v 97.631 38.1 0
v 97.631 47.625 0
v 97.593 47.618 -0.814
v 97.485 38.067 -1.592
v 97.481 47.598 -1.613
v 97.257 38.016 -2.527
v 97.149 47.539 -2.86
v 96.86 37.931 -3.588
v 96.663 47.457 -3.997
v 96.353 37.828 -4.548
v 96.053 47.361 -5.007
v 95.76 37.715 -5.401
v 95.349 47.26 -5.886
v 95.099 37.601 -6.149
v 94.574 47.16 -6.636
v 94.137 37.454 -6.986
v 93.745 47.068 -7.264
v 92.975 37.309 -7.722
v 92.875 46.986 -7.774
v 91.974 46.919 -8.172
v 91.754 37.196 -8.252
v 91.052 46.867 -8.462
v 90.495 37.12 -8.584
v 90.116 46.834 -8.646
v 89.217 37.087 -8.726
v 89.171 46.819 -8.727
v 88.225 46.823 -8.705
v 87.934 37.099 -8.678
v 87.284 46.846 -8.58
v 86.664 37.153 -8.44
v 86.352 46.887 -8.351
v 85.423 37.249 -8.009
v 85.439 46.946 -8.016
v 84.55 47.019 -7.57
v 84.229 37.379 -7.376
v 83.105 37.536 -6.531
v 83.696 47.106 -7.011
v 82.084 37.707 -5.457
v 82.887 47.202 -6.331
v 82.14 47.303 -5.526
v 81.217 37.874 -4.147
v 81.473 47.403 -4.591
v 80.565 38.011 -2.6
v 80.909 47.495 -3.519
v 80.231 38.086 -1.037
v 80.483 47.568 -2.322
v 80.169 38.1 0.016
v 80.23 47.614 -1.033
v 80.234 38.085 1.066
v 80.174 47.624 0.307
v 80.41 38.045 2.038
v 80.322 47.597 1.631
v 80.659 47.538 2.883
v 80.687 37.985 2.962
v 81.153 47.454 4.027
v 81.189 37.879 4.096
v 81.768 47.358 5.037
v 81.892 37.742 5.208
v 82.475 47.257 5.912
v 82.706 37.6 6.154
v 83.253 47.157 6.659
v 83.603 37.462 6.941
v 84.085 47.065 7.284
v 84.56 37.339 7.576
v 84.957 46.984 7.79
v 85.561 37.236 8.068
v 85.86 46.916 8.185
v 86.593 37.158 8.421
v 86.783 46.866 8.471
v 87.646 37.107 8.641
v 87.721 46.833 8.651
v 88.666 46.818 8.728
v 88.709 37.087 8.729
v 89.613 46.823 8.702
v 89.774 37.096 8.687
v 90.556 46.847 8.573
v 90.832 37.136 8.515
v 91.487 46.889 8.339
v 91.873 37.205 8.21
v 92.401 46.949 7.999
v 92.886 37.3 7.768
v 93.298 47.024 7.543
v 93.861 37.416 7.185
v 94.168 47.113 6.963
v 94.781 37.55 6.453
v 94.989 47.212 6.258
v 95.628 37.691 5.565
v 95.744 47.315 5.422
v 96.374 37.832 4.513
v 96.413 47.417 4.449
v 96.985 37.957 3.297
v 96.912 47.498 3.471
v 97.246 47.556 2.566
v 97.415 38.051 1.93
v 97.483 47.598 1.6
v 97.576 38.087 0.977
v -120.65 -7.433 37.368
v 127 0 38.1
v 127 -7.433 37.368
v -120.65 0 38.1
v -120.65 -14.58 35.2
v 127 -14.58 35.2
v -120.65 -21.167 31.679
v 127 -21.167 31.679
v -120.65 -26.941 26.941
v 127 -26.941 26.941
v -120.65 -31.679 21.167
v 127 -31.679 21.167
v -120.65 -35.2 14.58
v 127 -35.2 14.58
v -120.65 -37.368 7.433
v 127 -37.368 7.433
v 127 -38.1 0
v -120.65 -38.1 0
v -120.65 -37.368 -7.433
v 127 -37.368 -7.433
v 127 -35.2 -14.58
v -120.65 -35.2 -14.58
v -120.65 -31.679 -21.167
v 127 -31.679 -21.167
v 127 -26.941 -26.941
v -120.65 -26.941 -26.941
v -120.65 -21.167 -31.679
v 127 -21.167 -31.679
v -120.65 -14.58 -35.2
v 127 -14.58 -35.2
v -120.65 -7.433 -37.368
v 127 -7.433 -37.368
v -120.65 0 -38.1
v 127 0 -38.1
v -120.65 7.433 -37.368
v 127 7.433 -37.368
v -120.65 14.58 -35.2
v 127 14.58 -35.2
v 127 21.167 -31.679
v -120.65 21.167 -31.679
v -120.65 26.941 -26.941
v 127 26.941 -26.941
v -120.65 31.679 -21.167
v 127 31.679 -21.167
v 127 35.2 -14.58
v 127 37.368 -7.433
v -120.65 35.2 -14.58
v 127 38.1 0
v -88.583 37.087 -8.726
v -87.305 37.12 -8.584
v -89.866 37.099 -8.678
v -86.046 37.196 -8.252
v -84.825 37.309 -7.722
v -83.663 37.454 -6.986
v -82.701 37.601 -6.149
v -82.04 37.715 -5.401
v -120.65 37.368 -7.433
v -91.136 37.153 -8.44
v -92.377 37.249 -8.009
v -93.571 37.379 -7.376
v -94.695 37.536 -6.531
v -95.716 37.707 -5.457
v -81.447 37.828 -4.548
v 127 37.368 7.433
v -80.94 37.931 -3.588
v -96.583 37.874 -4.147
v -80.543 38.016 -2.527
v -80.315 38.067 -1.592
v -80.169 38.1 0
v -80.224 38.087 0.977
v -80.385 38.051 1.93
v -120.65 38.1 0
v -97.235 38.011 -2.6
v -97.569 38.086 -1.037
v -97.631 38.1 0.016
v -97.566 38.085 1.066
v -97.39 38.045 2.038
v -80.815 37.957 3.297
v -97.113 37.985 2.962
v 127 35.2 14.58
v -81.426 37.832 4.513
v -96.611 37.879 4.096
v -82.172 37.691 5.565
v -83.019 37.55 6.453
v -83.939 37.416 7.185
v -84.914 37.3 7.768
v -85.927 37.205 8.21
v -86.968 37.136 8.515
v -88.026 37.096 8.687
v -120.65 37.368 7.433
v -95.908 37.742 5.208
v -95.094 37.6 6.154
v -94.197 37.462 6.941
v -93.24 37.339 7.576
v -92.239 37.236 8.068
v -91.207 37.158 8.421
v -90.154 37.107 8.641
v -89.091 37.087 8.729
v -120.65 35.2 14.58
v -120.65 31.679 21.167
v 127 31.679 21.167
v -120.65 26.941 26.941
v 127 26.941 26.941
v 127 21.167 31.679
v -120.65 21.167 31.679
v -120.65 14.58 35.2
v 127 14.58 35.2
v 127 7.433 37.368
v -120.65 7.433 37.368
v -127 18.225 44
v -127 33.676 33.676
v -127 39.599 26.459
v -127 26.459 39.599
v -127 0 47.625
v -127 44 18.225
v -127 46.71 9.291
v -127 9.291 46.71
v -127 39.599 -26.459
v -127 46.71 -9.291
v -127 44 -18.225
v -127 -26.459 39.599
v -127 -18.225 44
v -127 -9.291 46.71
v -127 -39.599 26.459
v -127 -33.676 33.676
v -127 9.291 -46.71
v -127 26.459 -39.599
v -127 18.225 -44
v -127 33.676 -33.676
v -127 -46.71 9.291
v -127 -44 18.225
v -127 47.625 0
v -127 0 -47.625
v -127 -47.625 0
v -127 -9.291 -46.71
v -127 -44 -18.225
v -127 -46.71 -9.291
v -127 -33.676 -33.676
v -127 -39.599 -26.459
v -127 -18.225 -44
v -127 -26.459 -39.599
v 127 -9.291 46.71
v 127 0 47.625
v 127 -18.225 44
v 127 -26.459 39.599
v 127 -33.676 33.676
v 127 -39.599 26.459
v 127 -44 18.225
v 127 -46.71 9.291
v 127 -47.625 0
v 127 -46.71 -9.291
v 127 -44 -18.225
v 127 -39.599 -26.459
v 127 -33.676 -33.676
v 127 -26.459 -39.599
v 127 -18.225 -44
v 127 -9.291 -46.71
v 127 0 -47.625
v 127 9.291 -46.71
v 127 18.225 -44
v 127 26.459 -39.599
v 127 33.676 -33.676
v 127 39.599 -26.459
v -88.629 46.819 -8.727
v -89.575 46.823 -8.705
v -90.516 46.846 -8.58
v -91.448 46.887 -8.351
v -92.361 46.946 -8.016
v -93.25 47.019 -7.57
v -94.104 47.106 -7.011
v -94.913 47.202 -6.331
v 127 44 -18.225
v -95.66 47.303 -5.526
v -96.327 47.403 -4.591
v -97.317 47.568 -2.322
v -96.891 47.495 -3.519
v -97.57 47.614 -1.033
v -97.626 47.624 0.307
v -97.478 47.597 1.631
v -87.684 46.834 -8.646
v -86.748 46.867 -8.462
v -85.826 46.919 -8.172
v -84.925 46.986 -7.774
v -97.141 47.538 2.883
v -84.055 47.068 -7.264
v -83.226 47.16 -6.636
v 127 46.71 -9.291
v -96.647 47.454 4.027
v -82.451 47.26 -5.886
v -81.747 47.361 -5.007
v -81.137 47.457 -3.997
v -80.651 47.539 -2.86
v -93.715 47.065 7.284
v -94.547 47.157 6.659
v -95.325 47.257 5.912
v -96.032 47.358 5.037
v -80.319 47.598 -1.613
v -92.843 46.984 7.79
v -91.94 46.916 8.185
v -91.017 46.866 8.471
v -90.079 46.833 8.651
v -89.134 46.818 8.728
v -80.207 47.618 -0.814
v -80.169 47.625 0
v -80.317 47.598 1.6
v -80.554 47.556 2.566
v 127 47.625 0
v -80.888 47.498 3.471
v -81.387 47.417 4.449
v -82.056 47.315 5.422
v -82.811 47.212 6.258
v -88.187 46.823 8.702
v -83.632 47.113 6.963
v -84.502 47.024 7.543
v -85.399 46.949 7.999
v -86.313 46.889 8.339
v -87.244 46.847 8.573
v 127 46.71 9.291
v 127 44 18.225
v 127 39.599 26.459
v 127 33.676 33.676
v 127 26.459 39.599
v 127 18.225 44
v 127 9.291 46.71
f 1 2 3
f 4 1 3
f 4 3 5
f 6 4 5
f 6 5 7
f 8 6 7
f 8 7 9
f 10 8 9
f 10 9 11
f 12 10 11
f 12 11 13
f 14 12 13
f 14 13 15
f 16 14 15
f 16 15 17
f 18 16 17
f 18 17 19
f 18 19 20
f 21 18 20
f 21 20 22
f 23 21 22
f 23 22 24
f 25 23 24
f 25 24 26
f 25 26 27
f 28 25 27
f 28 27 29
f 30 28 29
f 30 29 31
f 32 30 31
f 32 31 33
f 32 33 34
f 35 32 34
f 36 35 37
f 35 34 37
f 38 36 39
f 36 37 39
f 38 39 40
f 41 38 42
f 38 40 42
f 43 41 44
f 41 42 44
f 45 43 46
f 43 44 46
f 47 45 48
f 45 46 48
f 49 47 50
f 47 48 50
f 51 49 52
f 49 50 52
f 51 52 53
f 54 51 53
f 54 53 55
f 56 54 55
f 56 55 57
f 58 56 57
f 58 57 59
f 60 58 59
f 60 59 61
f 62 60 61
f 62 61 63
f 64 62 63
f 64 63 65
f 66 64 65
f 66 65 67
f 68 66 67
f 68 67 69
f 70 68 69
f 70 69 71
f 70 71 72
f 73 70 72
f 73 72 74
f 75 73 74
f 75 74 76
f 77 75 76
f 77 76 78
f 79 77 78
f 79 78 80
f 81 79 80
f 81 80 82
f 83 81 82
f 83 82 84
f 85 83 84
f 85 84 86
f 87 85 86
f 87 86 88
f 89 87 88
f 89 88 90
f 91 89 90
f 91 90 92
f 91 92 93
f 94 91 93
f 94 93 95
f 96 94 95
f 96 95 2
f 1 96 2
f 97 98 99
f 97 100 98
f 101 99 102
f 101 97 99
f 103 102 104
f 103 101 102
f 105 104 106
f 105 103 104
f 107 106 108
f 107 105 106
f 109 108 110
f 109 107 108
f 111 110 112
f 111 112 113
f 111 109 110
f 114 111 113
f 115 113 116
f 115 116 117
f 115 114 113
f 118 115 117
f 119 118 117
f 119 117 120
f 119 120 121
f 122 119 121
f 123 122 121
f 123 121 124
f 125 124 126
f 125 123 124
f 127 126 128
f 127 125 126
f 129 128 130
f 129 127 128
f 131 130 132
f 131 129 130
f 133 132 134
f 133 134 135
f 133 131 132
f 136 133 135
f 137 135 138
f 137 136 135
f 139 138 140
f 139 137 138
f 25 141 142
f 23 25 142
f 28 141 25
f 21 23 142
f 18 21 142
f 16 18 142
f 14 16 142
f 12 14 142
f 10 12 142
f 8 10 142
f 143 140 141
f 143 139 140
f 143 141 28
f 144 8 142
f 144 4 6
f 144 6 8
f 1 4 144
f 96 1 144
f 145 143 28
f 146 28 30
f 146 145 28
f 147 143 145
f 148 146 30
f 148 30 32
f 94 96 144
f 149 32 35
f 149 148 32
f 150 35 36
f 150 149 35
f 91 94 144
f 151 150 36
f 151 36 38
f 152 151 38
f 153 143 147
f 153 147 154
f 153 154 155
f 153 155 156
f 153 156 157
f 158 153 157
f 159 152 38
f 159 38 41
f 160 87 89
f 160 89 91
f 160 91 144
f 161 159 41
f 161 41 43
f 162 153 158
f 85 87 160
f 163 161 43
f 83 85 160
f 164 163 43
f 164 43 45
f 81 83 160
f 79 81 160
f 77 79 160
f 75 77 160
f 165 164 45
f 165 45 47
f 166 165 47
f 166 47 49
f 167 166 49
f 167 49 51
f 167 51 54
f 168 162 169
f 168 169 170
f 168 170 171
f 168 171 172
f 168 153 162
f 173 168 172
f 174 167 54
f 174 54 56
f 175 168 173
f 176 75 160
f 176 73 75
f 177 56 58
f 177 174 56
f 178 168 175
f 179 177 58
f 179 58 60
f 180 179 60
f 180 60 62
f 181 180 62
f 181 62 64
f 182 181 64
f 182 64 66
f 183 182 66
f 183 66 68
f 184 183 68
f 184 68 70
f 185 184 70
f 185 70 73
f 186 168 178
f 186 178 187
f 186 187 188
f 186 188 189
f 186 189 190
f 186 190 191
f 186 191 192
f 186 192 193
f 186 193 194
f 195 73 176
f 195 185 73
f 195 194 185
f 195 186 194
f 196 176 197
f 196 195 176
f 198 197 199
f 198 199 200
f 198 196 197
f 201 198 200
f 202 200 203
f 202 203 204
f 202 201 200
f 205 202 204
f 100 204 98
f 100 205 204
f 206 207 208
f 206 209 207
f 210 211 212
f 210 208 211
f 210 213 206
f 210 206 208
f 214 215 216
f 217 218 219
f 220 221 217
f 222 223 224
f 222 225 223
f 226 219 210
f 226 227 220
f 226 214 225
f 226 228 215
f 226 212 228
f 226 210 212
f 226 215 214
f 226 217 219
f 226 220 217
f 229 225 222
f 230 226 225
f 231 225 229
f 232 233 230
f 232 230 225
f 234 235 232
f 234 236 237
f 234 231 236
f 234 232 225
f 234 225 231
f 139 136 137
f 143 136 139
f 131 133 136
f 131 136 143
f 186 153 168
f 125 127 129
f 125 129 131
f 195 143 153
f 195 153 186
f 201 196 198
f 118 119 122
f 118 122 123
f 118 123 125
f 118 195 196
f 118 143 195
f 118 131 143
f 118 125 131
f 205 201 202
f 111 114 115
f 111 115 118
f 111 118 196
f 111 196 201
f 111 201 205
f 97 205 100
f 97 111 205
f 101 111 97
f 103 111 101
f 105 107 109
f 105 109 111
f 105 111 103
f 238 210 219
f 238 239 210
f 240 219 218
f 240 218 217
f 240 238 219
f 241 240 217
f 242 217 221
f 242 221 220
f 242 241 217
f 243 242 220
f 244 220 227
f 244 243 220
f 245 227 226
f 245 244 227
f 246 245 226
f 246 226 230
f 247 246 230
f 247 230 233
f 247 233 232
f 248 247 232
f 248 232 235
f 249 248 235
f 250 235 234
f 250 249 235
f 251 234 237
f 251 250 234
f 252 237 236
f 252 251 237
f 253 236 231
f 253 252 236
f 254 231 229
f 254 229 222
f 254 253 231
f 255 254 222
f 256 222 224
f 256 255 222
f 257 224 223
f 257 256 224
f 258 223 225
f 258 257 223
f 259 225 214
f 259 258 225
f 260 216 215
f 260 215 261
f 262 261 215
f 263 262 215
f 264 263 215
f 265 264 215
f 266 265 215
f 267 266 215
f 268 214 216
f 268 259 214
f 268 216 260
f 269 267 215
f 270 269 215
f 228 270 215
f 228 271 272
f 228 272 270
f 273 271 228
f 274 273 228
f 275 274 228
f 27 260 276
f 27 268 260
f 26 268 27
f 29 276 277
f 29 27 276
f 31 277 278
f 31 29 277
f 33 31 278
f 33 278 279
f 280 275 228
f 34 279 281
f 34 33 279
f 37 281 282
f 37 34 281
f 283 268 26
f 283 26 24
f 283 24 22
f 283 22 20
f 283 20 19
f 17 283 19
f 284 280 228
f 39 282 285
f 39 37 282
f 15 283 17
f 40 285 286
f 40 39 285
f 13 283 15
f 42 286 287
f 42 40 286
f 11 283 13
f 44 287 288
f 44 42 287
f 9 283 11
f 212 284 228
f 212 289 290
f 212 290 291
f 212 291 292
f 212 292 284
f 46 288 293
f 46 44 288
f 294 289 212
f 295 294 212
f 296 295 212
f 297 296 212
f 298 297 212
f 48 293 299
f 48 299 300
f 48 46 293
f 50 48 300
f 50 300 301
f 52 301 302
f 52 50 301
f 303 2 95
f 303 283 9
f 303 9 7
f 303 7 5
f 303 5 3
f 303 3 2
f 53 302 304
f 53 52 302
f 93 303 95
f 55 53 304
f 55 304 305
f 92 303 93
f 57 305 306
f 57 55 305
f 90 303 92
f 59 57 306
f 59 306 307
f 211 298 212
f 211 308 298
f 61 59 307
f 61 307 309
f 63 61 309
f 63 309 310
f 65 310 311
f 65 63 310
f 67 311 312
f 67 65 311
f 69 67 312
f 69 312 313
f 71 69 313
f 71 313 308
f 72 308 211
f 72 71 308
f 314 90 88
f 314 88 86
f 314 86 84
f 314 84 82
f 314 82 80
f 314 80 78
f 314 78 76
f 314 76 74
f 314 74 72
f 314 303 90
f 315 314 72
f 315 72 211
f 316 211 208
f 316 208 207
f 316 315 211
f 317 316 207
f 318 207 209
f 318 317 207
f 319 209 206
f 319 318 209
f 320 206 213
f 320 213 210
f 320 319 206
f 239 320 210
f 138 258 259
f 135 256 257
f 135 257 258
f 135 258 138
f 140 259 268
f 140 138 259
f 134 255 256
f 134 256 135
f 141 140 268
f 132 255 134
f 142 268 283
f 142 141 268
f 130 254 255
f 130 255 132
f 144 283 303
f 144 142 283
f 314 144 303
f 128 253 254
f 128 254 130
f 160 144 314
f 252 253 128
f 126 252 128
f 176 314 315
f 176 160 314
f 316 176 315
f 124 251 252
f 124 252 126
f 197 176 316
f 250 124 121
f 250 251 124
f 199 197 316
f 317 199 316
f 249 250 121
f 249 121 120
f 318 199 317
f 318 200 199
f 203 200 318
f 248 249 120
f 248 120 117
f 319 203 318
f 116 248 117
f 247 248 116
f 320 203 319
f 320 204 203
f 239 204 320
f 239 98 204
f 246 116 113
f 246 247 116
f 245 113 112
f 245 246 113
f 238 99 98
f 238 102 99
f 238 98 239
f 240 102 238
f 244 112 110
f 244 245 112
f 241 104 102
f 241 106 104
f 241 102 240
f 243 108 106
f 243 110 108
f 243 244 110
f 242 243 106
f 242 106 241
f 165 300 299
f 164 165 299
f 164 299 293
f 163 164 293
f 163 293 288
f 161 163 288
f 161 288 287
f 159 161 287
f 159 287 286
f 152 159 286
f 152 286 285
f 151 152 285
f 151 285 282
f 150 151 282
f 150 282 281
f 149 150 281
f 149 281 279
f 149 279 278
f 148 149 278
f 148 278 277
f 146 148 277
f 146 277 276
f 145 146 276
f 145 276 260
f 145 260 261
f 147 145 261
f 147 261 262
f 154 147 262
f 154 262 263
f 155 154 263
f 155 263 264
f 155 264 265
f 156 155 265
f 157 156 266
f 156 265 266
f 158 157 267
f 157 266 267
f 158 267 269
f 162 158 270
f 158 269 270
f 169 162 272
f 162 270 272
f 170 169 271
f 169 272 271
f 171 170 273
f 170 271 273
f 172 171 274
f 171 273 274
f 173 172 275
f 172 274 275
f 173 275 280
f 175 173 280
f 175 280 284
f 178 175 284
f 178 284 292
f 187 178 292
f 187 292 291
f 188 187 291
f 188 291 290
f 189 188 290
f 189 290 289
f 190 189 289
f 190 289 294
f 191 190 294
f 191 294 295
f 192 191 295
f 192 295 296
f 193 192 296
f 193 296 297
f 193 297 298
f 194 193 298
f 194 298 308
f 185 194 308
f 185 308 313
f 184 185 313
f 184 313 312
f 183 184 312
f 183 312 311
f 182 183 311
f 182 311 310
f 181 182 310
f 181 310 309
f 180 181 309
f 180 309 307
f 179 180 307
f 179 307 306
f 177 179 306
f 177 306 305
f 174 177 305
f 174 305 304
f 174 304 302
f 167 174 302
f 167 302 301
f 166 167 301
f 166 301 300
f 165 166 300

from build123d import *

# Parameters (mm, degrees)
F_3_4_16_TAPPED_HOLE1_REACH  = 167.74
F_3_4_16_TAPPED_HOLE1_BORE_R = 8.73125


with BuildPart() as part:
    # Sketch1 → Revolve1 (revolve)
    with BuildSketch(Plane.XY, mode=Mode.PRIVATE) as revolve1_sk:
        Polygon((-127, 0), (-127, 47.625), (127, 47.625), (127, 38.1), (-120.65, 38.1), (-120.65, 0), align=None)
    revolve(revolve1_sk.sketch.rotate(Axis((-127, 0, 0), (1, 0, 0)), 90), axis=Axis((-127, 0, 0), (1, 0, 0)))

    # 3/4-16 Tapped Hole1 bore → 3/4-16 Tapped Hole1 (cut, up to next)
    with BuildSketch(Plane(origin=(0, 47.625, 0), x_dir=(1, 0, 0), z_dir=(0, 1, 0)), mode=Mode.PRIVATE) as f_3_4_16_tapped_hole1_sk1:
        with Locations((-88.9, 0)):
            Circle(F_3_4_16_TAPPED_HOLE1_BORE_R)
    f_3_4_16_tapped_hole1_tool1 = extrude(f_3_4_16_tapped_hole1_sk1.sketch, amount=-F_3_4_16_TAPPED_HOLE1_REACH, mode=Mode.PRIVATE) & part.part
    # 3/4-16 Tapped Hole1 bore → 3/4-16 Tapped Hole1 (cut, up to next)
    with BuildSketch(Plane(origin=(0, 47.625, 0), x_dir=(1, 0, 0), z_dir=(0, 1, 0)), mode=Mode.PRIVATE) as f_3_4_16_tapped_hole1_sk2:
        with Locations((88.9, 0)):
            Circle(F_3_4_16_TAPPED_HOLE1_BORE_R)
    f_3_4_16_tapped_hole1_tool2 = extrude(f_3_4_16_tapped_hole1_sk2.sketch, amount=-F_3_4_16_TAPPED_HOLE1_REACH, mode=Mode.PRIVATE) & part.part
    add(f_3_4_16_tapped_hole1_tool1.solids().sort_by_distance((-88.9, 47.625, 0))[0], mode=Mode.SUBTRACT)
    add(f_3_4_16_tapped_hole1_tool2.solids().sort_by_distance((88.9, 47.625, 0))[0], mode=Mode.SUBTRACT)


solid = part.part
